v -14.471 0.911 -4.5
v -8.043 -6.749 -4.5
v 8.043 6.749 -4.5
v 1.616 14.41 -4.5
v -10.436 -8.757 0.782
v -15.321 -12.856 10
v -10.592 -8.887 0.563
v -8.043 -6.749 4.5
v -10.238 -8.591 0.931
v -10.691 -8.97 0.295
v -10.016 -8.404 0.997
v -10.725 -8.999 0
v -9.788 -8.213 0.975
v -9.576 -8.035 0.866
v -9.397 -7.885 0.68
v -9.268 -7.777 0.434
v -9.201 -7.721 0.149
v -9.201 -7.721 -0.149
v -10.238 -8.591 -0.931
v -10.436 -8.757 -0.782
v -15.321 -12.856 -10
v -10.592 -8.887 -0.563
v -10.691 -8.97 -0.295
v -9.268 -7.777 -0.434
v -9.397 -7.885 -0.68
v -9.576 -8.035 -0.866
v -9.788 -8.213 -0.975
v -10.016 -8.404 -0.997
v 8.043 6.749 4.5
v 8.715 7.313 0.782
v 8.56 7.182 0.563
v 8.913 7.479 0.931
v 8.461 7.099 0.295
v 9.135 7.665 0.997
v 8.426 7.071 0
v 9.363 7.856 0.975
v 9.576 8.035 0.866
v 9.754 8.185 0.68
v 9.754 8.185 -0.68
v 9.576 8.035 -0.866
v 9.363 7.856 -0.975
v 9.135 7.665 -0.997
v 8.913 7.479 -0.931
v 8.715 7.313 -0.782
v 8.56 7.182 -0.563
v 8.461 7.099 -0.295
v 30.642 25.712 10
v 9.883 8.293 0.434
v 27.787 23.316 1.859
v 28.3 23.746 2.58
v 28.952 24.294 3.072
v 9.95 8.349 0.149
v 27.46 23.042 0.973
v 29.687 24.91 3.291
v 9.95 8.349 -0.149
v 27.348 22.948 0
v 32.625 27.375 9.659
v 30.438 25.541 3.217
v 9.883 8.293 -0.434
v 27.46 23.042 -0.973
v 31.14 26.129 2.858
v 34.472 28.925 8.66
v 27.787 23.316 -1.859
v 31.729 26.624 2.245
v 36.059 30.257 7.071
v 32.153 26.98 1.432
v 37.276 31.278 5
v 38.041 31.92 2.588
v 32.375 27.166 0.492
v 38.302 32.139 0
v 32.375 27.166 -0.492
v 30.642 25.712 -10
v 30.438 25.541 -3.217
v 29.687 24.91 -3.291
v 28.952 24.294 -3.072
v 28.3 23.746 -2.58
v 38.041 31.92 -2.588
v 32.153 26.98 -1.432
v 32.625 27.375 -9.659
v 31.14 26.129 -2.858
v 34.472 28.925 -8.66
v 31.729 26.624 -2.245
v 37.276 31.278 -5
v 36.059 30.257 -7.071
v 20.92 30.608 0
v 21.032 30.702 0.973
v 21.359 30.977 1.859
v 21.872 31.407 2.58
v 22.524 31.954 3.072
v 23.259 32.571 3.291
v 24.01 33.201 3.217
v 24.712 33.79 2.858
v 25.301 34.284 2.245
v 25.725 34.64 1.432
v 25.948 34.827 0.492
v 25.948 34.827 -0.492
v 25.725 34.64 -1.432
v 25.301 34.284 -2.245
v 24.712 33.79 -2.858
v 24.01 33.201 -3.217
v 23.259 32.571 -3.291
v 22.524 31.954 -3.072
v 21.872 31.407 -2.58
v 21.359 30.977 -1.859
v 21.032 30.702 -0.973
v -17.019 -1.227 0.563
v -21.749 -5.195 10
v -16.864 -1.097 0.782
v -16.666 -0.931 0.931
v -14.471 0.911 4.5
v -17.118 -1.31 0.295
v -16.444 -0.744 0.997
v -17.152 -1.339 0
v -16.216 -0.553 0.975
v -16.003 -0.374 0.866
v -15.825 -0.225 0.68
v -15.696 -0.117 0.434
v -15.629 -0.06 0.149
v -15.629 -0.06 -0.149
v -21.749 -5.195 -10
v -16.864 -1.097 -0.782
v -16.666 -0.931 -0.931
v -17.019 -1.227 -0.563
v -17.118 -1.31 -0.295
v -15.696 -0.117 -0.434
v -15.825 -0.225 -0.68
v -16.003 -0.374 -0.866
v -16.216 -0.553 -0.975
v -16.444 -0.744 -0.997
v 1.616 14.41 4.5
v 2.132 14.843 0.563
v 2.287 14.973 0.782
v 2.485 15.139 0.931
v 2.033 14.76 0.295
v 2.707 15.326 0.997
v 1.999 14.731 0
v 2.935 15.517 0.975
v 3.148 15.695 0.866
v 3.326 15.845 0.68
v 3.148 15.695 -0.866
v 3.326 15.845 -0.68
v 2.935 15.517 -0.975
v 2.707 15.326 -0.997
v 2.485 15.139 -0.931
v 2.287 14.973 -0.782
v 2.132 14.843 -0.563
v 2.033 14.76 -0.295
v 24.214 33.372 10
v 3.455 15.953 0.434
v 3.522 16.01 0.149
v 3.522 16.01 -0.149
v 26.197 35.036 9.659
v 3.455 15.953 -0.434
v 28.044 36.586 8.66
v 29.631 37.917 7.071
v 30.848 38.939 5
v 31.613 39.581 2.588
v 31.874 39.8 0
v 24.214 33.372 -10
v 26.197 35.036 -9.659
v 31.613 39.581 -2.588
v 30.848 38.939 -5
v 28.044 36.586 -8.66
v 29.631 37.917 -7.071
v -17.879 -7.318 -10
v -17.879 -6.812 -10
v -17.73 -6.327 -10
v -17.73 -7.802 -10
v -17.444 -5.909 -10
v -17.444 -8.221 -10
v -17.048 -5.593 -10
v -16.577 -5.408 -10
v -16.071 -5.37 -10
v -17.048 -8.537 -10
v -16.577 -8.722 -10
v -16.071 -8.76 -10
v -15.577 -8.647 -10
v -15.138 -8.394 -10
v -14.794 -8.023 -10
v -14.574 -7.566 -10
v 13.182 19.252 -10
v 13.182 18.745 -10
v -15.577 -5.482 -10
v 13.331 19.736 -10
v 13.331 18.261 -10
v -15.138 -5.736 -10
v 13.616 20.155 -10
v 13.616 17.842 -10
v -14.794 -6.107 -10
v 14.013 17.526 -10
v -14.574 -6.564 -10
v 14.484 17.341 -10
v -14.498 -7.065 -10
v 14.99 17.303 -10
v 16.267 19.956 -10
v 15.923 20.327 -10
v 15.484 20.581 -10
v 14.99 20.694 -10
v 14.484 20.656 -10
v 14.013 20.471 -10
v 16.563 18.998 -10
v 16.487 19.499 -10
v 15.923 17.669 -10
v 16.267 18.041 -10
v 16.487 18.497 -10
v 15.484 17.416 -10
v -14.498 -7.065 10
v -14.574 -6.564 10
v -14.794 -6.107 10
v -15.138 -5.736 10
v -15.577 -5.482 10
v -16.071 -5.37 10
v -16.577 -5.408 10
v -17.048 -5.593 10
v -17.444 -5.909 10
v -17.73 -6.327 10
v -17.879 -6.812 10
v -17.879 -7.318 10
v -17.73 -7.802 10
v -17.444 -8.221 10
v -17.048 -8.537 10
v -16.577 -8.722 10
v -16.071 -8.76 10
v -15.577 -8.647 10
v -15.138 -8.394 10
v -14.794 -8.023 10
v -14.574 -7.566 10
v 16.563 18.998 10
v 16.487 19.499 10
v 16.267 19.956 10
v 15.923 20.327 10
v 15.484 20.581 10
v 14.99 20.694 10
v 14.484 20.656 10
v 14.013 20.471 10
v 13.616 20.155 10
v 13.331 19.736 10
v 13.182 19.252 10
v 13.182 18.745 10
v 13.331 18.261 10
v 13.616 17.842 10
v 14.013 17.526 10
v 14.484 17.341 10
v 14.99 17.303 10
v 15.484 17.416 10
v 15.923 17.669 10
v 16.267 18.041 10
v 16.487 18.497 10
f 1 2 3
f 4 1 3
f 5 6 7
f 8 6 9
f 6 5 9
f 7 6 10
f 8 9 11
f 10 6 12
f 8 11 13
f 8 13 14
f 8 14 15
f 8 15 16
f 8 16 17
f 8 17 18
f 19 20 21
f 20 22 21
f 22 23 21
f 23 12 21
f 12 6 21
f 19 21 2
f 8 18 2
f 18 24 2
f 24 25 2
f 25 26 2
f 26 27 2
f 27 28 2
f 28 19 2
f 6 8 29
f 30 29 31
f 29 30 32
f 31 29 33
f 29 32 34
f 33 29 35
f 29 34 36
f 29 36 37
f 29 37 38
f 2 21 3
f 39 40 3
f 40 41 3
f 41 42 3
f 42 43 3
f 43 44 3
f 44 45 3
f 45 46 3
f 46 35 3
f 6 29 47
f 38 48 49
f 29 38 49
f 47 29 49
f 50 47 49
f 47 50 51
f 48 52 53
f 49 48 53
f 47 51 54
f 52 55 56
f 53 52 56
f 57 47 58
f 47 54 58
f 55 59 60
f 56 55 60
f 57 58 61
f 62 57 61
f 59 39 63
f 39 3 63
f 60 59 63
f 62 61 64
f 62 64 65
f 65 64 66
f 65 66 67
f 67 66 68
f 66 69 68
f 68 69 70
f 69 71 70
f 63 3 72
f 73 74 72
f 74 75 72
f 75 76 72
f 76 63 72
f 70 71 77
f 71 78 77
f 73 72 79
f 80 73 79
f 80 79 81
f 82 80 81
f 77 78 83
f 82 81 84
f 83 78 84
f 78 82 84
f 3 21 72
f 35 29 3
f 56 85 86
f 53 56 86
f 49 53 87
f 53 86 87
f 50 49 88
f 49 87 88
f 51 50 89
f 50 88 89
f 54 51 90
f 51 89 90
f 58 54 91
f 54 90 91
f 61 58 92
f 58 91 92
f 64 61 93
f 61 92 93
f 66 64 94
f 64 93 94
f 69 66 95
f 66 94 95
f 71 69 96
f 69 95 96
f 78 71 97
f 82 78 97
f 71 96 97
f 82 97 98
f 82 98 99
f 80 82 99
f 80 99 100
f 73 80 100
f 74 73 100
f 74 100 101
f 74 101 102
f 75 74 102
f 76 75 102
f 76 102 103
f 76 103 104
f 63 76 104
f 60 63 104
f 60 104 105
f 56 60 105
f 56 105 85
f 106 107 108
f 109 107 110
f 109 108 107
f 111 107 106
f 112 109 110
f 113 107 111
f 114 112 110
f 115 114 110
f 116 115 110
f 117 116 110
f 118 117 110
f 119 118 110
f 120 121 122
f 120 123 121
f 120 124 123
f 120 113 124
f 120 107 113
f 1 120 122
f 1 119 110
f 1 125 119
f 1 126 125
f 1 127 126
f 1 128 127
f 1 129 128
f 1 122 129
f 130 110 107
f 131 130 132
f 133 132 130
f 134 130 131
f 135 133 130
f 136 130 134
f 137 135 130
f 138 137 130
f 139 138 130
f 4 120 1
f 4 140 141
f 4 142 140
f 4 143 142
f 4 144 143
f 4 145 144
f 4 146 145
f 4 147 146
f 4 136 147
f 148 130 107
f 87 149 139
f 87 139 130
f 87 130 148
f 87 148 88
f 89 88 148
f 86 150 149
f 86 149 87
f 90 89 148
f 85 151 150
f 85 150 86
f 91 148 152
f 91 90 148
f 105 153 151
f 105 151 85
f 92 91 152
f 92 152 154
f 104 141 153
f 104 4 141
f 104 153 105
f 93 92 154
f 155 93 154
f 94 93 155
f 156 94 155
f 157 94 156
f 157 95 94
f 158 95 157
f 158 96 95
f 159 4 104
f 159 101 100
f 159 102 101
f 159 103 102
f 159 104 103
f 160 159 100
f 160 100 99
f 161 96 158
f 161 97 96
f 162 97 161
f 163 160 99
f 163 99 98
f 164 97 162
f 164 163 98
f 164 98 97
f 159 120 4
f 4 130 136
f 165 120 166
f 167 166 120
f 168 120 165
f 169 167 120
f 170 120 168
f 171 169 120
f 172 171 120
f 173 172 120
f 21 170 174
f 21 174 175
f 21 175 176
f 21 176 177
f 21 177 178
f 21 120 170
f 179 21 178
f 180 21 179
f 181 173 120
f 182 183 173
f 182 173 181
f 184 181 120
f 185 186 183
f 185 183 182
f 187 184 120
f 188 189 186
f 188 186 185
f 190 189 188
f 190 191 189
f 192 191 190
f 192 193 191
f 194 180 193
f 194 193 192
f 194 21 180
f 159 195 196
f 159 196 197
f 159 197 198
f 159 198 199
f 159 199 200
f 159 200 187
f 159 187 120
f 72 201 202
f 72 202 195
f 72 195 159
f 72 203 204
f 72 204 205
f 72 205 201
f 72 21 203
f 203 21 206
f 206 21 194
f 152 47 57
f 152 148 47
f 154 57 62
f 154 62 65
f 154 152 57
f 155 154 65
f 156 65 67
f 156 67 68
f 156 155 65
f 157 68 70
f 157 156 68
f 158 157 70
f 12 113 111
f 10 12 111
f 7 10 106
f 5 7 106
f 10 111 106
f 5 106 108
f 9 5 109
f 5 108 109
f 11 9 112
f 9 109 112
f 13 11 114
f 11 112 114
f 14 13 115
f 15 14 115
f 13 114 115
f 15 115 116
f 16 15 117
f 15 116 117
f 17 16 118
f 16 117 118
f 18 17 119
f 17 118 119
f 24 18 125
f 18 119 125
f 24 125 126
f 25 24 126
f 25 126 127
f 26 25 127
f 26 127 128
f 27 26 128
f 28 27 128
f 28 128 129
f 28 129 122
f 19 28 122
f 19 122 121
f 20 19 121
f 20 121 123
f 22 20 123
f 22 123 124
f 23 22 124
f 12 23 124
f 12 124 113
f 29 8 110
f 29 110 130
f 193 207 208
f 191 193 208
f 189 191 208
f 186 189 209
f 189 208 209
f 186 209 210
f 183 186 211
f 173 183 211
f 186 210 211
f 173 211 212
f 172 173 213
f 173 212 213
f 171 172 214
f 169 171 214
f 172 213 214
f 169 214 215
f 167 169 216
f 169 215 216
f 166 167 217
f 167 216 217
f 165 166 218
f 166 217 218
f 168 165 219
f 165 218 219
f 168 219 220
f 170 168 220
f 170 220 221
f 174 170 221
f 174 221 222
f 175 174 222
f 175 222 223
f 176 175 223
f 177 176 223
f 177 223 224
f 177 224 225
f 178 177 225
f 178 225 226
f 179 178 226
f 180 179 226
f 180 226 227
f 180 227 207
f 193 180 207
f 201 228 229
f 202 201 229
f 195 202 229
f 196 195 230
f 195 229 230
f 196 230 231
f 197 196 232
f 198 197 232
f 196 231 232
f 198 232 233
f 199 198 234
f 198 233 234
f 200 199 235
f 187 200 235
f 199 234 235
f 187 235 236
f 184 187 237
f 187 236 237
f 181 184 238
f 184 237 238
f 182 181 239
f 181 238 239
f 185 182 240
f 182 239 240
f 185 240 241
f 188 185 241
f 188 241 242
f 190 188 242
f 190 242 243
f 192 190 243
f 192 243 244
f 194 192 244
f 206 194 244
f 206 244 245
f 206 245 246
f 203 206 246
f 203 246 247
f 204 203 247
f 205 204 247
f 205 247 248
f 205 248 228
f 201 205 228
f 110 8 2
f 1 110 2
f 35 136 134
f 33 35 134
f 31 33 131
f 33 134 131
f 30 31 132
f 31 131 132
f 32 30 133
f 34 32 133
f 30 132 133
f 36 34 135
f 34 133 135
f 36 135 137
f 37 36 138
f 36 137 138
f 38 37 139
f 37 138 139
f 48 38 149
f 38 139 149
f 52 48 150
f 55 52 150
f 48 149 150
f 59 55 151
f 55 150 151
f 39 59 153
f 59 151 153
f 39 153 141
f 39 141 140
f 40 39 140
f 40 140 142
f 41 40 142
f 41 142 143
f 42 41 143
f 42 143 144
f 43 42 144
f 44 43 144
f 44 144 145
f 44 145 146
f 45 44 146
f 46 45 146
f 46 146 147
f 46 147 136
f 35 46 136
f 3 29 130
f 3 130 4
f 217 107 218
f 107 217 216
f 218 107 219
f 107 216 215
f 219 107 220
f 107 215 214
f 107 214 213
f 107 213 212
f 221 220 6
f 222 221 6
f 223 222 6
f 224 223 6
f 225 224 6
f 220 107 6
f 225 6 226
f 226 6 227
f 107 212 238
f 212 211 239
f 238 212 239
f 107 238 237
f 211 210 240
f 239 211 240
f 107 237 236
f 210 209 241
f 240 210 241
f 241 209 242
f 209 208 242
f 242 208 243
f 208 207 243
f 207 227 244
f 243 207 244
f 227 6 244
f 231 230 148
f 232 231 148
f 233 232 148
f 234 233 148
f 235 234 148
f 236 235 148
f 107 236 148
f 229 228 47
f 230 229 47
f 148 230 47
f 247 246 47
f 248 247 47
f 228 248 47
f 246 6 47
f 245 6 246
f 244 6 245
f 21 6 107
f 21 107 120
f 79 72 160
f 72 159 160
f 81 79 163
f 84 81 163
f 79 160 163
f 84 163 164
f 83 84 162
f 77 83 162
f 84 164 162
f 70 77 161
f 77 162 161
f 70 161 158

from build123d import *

# Parameters (mm, degrees)
SKETCH_1_W          = 70
SKETCH_1_H          = 20
SKETCH_1_W_2        = 21
SKETCH_1_H_2        = 9
EXTRUDE_1_DEPTH     = 10
CUT_EXTRUDE_1_REACH = 57.98
SKETCH_3_R          = 3.3
SKETCH_3_R_2        = 1
CUT_EXTRUDE_2_REACH = 60.746
SKETCH_4_R          = 1.7
FILLET_1_R          = 10


with BuildPart() as part:
    # 草图1 → 凸台-拉伸1 (new body)
    with BuildSketch(Plane(origin=(0, 0, 0), x_dir=(0.7660444431189771, 0.6427876096865406, 0), z_dir=(-0.6427876096865406, 0.7660444431189771, 0))):
        with Locations((15, 0)):
            Rectangle(SKETCH_1_W, SKETCH_1_H)
        Rectangle(SKETCH_1_W_2, SKETCH_1_H_2, mode=Mode.SUBTRACT)
    extrude(amount=EXTRUDE_1_DEPTH)

    # 草图3 → 切除-拉伸1 (cut, up to next)
    with BuildSketch(Plane(origin=(-6.427876097, 7.660444431, 0), x_dir=(0.7660444431189771, 0.6427876096865406, 0), z_dir=(-0.6427876096865405, 0.766044443118977, 0)), mode=Mode.PRIVATE) as cut_extrude_1_sk1:
        with Locations(Location((39, 0, 0), (0, 0, 180))):
            Circle(SKETCH_3_R)
    cut_extrude_1_tool1 = extrude(cut_extrude_1_sk1.sketch, amount=-CUT_EXTRUDE_1_REACH, mode=Mode.PRIVATE) & part.part
    # 草图3 → 切除-拉伸1 (cut, up to next)
    with BuildSketch(Plane(origin=(-6.427876097, 7.660444431, 0), x_dir=(0.7660444431189771, 0.6427876096865406, 0), z_dir=(-0.6427876096865405, 0.766044443118977, 0)), mode=Mode.PRIVATE) as cut_extrude_1_sk2:
        with Locations(Location((-13, 0, 0), (0, 0, 180))):
            Circle(SKETCH_3_R_2)
    cut_extrude_1_tool2 = extrude(cut_extrude_1_sk2.sketch, amount=-CUT_EXTRUDE_1_REACH, mode=Mode.PRIVATE) & part.part
    # 草图3 → 切除-拉伸1 (cut, up to next)
    with BuildSketch(Plane(origin=(-6.427876097, 7.660444431, 0), x_dir=(0.7660444431189771, 0.6427876096865406, 0), z_dir=(-0.6427876096865405, 0.766044443118977, 0)), mode=Mode.PRIVATE) as cut_extrude_1_sk3:
        with Locations(Location((12, 0, 0), (0, 0, 180))):
            Circle(SKETCH_3_R_2)
    cut_extrude_1_tool3 = extrude(cut_extrude_1_sk3.sketch, amount=-CUT_EXTRUDE_1_REACH, mode=Mode.PRIVATE) & part.part
    add(cut_extrude_1_tool1.solids().sort_by_distance((23.447857, 32.729161, 0))[0], mode=Mode.SUBTRACT)
    add(cut_extrude_1_tool2.solids().sort_by_distance((-16.386454, -0.695794, 0))[0], mode=Mode.SUBTRACT)
    add(cut_extrude_1_tool3.solids().sort_by_distance((2.764657, 15.373896, 0))[0], mode=Mode.SUBTRACT)

    # 草图4 → 切除-拉伸2 (cut, up to next)
    with BuildSketch(Plane.XY.offset(10), mode=Mode.PRIVATE) as cut_extrude_2_sk1:
        with Locations((-16.198218668, -7.064882864)):
            Circle(SKETCH_4_R)
    cut_extrude_2_tool1 = extrude(cut_extrude_2_sk1.sketch, amount=-CUT_EXTRUDE_2_REACH, mode=Mode.PRIVATE) & part.part
    # 草图4 → 切除-拉伸2 (cut, up to next)
    with BuildSketch(Plane.XY.offset(10), mode=Mode.PRIVATE) as cut_extrude_2_sk2:
        with Locations((14.862649296, 18.998279989)):
            Circle(SKETCH_4_R)
    cut_extrude_2_tool2 = extrude(cut_extrude_2_sk2.sketch, amount=-CUT_EXTRUDE_2_REACH, mode=Mode.PRIVATE) & part.part
    add(cut_extrude_2_tool1.solids().sort_by_distance((-16.198219, -7.064883, 10))[0], mode=Mode.SUBTRACT)
    add(cut_extrude_2_tool2.solids().sort_by_distance((14.862649, 18.99828, 10))[0], mode=Mode.SUBTRACT)

    # 圆角1
    fillet_1_edges = [part.edges().sort_by_distance(p)[0] for p in [
        (35.088284108, 35.9696027, -10),
        (35.088284108, 35.9696027, 10),
    ]]
    fillet(fillet_1_edges, radius=FILLET_1_R - 0.0001)  # a hair under: the kernel refuses the full size


solid = part.part
